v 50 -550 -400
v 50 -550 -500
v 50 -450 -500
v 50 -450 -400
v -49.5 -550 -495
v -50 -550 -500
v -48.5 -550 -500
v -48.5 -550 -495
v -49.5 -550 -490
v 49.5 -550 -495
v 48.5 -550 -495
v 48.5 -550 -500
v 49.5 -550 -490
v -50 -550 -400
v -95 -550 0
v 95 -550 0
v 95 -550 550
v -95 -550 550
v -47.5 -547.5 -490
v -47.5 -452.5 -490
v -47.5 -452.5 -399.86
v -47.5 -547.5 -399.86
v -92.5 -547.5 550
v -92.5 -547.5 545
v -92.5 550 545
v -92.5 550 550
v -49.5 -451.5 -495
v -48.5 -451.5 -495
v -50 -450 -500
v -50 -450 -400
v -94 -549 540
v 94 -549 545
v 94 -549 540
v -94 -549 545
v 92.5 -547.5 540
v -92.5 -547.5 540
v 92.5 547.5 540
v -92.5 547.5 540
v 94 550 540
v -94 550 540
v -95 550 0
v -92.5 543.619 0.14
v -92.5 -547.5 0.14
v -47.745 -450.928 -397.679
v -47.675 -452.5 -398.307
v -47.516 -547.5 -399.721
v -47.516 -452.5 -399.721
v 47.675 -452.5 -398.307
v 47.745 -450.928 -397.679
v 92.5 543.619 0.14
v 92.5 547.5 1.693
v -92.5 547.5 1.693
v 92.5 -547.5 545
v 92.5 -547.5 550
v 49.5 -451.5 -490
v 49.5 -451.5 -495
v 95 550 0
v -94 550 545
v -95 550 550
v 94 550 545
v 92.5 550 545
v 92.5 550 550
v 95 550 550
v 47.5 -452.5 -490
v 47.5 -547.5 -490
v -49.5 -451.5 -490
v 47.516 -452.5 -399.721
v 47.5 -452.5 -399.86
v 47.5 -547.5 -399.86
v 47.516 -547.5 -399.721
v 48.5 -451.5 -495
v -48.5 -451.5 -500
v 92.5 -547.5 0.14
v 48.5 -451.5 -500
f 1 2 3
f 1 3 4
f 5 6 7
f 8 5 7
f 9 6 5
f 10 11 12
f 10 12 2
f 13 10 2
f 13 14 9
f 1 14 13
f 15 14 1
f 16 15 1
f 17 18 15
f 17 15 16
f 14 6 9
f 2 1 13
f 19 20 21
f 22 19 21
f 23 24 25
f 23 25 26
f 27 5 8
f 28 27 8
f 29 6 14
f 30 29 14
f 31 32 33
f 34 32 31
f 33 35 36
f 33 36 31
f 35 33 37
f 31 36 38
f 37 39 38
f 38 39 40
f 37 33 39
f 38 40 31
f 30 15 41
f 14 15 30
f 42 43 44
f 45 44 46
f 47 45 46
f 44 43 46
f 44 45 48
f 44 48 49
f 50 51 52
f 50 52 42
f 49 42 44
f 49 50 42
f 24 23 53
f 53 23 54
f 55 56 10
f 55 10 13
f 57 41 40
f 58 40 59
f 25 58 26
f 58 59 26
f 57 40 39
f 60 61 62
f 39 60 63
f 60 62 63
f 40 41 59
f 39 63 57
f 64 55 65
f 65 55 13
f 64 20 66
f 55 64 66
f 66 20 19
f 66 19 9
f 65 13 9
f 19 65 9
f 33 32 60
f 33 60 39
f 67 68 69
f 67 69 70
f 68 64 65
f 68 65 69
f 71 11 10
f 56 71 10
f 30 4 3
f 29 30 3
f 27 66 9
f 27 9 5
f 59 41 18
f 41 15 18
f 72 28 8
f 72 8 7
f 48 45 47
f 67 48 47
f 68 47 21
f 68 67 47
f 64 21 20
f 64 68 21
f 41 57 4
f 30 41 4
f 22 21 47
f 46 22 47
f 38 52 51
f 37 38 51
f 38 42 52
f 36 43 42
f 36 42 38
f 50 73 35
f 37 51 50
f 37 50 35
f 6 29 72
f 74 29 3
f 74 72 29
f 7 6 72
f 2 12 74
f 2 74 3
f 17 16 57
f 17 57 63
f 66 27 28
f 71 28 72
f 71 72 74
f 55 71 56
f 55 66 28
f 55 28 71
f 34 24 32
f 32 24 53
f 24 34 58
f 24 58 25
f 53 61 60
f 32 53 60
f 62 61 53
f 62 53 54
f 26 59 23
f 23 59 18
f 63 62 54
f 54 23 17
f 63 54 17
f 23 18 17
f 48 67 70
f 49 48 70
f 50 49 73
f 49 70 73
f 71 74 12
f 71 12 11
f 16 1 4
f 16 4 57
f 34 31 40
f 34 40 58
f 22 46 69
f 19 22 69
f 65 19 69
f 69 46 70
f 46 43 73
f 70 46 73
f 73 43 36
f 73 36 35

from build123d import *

# Parameters (mm, degrees)
F0_W        = 100
F0_H        = 100
F0_W_2      = 190
F0_H_2      = 550
F1_DEPTH    = 550
F3_DEPTH    = 190
F4_T        = 2.5
F4_T3_DEPTH = 105
F4_T5_DEPTH = 105
F6_DEPTH    = 98.5
F7_W        = 185
F7_H        = 5
F8_DEPTH    = 2.5
F9_DEPTH    = 1099


# Not quite as in the source:
# - a shell that OpenCascade refuses in one call is made with other operations: the cavity is built on its own and cut out


with BuildPart() as f1:
    # F0 (on Front) → F1 (new body, symmetric)
    with BuildSketch(Plane.XZ):
        with Locations((0, -450)):
            Rectangle(F0_W, F0_H)
        with Locations((0, 275)):
            Rectangle(F0_W_2, F0_H_2)
        Polygon((50, -400), (95, 0), (-95, 0), (-50, -400), align=None)
    extrude(amount=F1_DEPTH, both=True)

    # F2 (on face) → F3 (cut)
    with BuildSketch(Plane.YZ.offset(95)):
        Polygon((550, -500), (550, 0), (-450, -400), (-450, -500), align=None)
    extrude(amount=-F3_DEPTH, mode=Mode.SUBTRACT)

    # F4: shell of thickness 2.5, made by hand


with BuildPart() as f4_core1:
    # F4_t2: copy of F1
    add(f1.part)

    # the walls: a layer under each face that stays
    f4_faces = [f4_core1.faces().sort_by_distance(p)[0] for p in [
        (50, -500, -450),
        (0, -550, 25),
        (72.5, 0, -200),
        (0, -450, -450),
        (-50, -500, -450),
        (95, 0, 275),
        (-95, 0, 275),
        (-72.5, 0, -200),
        (0, 50, -200),
        (0, 550, 275),
    ]]
    thicken(f4_faces, amount=-F4_T, mode=Mode.SUBTRACT)

    # F4_s4 → F4_t3 (cut)
    with BuildSketch(Plane.XZ.offset(447.5)):
        Polygon((50.0498432829, -400.0027948693), (47.5, -400), (47.5, -399.8598171527), (47.5156717096, -399.7205130673), align=None)
        Polygon((-50.0498432829, -400.0027948693), (-47.5, -400), (-47.5, -399.8598171527), (-47.5156717096, -399.7205130673), align=None)
    extrude(amount=F4_T3_DEPTH, mode=Mode.SUBTRACT)

    # F4_s6 → F4_t5 (cut)
    with BuildSketch(Plane.YZ.offset(-52.5)):
        Polygon((-449.9657152331, -400.0232119173), (-452.5, -400), (-452.5, -398.3074175964), (-450.9284766909, -397.6788082728), align=None)
    extrude(amount=F4_T5_DEPTH, mode=Mode.SUBTRACT)


with BuildPart() as f1_1:
    add(f1.part)

    # what is left inside the walls is the cavity
    f4_cavity = [f4_core1.part.solids().sort_by_distance(p)[0] for p in [
        (-92.475, 182.5, 275.070091),
    ]]
    add(f4_cavity, mode=Mode.SUBTRACT)

    # F5 (on face) → F6 (cut)
    with BuildSketch(Plane.XZ.offset(550)):
        Polygon((-48.5, -495), (-48.5, -500), (48.5, -500), (48.5, -495), (49.5, -495), (49.5, -490), (-49.5, -490), (-49.5, -495), align=None)
    extrude(amount=-F6_DEPTH, mode=Mode.SUBTRACT)

    # F7 (on face) → F8 (cut)
    with BuildSketch(Plane(origin=(0, 550, 0), x_dir=(-1, 0, 0), z_dir=(0, 1, 0))):
        with Locations((0, 547.5)):
            Rectangle(F7_W, F7_H)
    extrude(amount=-F8_DEPTH, mode=Mode.SUBTRACT)

    # F7 (on face) → F9 (cut)
    with BuildSketch(Plane(origin=(0, 550, 0), x_dir=(-1, 0, 0), z_dir=(0, 1, 0))):
        Polygon((92.5, 545), (-92.5, 545), (-94, 545), (-94, 540), (94, 540), (94, 545), align=None)
    extrude(amount=-F9_DEPTH, mode=Mode.SUBTRACT)


solid = f1_1.part
